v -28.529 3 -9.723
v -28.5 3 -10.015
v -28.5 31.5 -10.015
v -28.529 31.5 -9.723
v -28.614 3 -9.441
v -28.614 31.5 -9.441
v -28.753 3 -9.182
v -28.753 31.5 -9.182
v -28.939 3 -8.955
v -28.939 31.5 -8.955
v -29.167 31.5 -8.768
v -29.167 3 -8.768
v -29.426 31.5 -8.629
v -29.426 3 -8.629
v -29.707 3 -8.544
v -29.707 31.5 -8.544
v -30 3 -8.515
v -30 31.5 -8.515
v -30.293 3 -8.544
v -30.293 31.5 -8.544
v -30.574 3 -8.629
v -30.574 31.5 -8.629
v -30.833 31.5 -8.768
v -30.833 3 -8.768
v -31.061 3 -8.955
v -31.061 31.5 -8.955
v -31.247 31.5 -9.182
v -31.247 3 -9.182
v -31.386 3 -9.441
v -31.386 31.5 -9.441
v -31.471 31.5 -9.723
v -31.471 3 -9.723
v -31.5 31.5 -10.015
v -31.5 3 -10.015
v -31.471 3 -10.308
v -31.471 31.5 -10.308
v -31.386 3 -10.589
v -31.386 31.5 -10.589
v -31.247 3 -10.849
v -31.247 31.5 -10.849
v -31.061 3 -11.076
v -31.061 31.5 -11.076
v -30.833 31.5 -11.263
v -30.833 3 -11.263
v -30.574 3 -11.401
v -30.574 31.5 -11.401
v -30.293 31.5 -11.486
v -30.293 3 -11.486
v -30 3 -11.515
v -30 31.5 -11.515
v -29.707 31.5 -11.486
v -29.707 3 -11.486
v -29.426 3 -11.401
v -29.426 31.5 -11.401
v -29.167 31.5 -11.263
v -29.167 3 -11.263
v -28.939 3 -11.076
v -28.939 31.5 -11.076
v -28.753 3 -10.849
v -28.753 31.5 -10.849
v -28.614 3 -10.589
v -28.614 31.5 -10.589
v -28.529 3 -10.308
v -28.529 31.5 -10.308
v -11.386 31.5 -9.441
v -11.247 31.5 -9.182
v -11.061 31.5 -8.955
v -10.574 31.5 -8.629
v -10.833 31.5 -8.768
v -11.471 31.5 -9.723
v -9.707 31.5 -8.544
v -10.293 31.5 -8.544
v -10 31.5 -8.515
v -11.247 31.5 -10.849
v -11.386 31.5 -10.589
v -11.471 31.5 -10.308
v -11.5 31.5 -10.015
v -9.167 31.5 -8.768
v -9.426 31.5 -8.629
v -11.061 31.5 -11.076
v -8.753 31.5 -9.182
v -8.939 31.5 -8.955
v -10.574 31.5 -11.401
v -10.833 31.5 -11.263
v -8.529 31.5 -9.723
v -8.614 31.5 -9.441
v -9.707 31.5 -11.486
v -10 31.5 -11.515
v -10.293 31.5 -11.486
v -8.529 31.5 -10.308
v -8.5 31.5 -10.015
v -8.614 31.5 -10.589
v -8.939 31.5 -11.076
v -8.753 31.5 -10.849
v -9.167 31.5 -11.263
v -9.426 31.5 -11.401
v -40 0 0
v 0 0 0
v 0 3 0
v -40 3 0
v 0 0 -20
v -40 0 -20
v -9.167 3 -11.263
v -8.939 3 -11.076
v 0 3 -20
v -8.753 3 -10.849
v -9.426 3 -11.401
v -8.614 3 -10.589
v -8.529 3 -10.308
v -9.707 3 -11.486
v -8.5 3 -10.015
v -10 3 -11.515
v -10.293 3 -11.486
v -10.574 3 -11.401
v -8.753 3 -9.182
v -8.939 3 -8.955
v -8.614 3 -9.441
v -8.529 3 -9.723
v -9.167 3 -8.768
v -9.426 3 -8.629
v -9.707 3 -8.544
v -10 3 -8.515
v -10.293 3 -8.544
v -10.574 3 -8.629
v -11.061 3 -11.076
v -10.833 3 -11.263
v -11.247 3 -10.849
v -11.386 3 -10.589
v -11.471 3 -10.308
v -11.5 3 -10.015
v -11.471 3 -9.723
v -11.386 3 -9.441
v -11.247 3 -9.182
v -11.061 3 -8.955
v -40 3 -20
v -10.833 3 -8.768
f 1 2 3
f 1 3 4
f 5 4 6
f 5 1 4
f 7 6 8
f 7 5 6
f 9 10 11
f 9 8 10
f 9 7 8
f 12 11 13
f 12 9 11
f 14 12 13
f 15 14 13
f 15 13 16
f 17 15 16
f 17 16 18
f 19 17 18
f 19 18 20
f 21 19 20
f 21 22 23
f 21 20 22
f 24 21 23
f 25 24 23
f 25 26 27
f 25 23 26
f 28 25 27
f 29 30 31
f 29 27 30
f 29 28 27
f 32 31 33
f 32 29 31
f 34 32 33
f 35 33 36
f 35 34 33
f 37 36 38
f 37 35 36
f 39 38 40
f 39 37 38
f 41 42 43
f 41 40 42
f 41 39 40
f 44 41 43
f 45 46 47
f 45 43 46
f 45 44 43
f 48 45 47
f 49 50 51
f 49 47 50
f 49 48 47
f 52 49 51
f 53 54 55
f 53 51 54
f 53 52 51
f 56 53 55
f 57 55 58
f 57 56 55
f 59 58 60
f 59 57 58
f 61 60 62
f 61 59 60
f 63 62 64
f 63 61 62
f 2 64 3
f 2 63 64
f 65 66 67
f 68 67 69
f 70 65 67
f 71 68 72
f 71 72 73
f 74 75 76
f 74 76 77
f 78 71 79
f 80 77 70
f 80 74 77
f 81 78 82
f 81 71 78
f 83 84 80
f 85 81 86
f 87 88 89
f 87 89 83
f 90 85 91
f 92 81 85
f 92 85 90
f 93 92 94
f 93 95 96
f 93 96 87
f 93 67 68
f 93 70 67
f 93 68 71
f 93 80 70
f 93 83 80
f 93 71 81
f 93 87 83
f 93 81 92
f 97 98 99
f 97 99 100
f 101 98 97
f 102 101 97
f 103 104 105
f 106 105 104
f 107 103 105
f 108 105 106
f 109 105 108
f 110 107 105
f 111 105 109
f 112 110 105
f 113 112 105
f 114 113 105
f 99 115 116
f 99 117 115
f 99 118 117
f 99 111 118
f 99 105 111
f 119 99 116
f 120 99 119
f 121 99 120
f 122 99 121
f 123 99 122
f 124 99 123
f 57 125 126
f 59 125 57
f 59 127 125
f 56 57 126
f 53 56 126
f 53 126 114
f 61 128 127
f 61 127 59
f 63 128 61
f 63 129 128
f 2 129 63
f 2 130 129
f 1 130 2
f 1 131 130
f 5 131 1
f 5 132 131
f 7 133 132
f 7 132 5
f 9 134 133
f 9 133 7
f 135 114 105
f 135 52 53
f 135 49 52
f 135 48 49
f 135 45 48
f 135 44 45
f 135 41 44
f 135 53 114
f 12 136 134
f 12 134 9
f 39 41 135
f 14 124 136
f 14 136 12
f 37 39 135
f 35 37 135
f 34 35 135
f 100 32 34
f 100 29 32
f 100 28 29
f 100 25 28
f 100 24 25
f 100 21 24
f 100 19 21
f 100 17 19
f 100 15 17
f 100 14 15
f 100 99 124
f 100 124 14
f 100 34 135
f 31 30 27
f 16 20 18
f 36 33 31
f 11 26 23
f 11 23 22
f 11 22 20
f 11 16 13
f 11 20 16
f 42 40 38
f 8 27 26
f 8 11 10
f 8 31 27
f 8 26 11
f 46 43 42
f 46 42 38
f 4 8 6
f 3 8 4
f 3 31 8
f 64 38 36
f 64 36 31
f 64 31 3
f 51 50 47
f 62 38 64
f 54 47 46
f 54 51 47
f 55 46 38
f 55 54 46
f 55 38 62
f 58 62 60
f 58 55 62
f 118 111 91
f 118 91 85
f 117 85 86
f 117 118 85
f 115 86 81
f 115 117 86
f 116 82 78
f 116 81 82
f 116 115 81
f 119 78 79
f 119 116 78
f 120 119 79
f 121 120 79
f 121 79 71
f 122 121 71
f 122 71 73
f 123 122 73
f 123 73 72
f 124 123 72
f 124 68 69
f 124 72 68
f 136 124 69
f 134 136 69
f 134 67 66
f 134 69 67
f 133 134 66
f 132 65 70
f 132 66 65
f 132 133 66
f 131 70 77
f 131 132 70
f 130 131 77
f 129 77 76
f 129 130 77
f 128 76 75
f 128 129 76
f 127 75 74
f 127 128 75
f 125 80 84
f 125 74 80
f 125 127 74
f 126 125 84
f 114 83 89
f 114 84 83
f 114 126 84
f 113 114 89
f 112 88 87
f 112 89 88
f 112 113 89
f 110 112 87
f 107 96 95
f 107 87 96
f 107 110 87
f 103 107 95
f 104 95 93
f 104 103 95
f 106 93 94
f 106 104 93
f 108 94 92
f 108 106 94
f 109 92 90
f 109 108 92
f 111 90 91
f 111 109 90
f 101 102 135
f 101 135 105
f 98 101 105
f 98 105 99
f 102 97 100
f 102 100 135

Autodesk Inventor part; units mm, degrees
ref_plane "YZ Plane" through (0, 0, 0) normal (1, 0, 0) x (0, 1, 0)
ref_plane "XZ Plane" through (0, 0, 0) normal (0, 1, 0) x (-1, 0, 0)
ref_plane "XY Plane" through (0, 0, 0) normal (0, 0, 1) x (1, 0, 0)
sketch "Esboço1" plane through (0, 0, 0) normal (0, 1, 0) x (-1, 0, 0)
  line L0 (0, 0) -> (40, 0)
  line L1 (40, 0) -> (40, -20)
  line L2 (40, -20) -> (0, -20)
  line L3 (0, -20) -> (0, 0)
  dimension "d0" = 40
  dimension "d1" = 20
extrude "Extrusão1" add sketch "Esboço1" along normal blind 3
sketch "Esboço2" plane through (0, 3, 0) normal (0, 1, 0) x (1, 0, 0)
  circle A0 centre (-30, 10.0153) radius 1.5
  circle A1 centre (-10, 10.0153) radius 1.5
  line L0 (-40, 20) -> (-40, 0) projected
  line L1 (0, 0) -> (0, 20) projected
  dimension "d5" = 3
  dimension "d6" = 3
  dimension "d7" = 10
  dimension "d8" = 10
extrude "Extrusão2" add sketch "Esboço2" along normal blind 28.5
